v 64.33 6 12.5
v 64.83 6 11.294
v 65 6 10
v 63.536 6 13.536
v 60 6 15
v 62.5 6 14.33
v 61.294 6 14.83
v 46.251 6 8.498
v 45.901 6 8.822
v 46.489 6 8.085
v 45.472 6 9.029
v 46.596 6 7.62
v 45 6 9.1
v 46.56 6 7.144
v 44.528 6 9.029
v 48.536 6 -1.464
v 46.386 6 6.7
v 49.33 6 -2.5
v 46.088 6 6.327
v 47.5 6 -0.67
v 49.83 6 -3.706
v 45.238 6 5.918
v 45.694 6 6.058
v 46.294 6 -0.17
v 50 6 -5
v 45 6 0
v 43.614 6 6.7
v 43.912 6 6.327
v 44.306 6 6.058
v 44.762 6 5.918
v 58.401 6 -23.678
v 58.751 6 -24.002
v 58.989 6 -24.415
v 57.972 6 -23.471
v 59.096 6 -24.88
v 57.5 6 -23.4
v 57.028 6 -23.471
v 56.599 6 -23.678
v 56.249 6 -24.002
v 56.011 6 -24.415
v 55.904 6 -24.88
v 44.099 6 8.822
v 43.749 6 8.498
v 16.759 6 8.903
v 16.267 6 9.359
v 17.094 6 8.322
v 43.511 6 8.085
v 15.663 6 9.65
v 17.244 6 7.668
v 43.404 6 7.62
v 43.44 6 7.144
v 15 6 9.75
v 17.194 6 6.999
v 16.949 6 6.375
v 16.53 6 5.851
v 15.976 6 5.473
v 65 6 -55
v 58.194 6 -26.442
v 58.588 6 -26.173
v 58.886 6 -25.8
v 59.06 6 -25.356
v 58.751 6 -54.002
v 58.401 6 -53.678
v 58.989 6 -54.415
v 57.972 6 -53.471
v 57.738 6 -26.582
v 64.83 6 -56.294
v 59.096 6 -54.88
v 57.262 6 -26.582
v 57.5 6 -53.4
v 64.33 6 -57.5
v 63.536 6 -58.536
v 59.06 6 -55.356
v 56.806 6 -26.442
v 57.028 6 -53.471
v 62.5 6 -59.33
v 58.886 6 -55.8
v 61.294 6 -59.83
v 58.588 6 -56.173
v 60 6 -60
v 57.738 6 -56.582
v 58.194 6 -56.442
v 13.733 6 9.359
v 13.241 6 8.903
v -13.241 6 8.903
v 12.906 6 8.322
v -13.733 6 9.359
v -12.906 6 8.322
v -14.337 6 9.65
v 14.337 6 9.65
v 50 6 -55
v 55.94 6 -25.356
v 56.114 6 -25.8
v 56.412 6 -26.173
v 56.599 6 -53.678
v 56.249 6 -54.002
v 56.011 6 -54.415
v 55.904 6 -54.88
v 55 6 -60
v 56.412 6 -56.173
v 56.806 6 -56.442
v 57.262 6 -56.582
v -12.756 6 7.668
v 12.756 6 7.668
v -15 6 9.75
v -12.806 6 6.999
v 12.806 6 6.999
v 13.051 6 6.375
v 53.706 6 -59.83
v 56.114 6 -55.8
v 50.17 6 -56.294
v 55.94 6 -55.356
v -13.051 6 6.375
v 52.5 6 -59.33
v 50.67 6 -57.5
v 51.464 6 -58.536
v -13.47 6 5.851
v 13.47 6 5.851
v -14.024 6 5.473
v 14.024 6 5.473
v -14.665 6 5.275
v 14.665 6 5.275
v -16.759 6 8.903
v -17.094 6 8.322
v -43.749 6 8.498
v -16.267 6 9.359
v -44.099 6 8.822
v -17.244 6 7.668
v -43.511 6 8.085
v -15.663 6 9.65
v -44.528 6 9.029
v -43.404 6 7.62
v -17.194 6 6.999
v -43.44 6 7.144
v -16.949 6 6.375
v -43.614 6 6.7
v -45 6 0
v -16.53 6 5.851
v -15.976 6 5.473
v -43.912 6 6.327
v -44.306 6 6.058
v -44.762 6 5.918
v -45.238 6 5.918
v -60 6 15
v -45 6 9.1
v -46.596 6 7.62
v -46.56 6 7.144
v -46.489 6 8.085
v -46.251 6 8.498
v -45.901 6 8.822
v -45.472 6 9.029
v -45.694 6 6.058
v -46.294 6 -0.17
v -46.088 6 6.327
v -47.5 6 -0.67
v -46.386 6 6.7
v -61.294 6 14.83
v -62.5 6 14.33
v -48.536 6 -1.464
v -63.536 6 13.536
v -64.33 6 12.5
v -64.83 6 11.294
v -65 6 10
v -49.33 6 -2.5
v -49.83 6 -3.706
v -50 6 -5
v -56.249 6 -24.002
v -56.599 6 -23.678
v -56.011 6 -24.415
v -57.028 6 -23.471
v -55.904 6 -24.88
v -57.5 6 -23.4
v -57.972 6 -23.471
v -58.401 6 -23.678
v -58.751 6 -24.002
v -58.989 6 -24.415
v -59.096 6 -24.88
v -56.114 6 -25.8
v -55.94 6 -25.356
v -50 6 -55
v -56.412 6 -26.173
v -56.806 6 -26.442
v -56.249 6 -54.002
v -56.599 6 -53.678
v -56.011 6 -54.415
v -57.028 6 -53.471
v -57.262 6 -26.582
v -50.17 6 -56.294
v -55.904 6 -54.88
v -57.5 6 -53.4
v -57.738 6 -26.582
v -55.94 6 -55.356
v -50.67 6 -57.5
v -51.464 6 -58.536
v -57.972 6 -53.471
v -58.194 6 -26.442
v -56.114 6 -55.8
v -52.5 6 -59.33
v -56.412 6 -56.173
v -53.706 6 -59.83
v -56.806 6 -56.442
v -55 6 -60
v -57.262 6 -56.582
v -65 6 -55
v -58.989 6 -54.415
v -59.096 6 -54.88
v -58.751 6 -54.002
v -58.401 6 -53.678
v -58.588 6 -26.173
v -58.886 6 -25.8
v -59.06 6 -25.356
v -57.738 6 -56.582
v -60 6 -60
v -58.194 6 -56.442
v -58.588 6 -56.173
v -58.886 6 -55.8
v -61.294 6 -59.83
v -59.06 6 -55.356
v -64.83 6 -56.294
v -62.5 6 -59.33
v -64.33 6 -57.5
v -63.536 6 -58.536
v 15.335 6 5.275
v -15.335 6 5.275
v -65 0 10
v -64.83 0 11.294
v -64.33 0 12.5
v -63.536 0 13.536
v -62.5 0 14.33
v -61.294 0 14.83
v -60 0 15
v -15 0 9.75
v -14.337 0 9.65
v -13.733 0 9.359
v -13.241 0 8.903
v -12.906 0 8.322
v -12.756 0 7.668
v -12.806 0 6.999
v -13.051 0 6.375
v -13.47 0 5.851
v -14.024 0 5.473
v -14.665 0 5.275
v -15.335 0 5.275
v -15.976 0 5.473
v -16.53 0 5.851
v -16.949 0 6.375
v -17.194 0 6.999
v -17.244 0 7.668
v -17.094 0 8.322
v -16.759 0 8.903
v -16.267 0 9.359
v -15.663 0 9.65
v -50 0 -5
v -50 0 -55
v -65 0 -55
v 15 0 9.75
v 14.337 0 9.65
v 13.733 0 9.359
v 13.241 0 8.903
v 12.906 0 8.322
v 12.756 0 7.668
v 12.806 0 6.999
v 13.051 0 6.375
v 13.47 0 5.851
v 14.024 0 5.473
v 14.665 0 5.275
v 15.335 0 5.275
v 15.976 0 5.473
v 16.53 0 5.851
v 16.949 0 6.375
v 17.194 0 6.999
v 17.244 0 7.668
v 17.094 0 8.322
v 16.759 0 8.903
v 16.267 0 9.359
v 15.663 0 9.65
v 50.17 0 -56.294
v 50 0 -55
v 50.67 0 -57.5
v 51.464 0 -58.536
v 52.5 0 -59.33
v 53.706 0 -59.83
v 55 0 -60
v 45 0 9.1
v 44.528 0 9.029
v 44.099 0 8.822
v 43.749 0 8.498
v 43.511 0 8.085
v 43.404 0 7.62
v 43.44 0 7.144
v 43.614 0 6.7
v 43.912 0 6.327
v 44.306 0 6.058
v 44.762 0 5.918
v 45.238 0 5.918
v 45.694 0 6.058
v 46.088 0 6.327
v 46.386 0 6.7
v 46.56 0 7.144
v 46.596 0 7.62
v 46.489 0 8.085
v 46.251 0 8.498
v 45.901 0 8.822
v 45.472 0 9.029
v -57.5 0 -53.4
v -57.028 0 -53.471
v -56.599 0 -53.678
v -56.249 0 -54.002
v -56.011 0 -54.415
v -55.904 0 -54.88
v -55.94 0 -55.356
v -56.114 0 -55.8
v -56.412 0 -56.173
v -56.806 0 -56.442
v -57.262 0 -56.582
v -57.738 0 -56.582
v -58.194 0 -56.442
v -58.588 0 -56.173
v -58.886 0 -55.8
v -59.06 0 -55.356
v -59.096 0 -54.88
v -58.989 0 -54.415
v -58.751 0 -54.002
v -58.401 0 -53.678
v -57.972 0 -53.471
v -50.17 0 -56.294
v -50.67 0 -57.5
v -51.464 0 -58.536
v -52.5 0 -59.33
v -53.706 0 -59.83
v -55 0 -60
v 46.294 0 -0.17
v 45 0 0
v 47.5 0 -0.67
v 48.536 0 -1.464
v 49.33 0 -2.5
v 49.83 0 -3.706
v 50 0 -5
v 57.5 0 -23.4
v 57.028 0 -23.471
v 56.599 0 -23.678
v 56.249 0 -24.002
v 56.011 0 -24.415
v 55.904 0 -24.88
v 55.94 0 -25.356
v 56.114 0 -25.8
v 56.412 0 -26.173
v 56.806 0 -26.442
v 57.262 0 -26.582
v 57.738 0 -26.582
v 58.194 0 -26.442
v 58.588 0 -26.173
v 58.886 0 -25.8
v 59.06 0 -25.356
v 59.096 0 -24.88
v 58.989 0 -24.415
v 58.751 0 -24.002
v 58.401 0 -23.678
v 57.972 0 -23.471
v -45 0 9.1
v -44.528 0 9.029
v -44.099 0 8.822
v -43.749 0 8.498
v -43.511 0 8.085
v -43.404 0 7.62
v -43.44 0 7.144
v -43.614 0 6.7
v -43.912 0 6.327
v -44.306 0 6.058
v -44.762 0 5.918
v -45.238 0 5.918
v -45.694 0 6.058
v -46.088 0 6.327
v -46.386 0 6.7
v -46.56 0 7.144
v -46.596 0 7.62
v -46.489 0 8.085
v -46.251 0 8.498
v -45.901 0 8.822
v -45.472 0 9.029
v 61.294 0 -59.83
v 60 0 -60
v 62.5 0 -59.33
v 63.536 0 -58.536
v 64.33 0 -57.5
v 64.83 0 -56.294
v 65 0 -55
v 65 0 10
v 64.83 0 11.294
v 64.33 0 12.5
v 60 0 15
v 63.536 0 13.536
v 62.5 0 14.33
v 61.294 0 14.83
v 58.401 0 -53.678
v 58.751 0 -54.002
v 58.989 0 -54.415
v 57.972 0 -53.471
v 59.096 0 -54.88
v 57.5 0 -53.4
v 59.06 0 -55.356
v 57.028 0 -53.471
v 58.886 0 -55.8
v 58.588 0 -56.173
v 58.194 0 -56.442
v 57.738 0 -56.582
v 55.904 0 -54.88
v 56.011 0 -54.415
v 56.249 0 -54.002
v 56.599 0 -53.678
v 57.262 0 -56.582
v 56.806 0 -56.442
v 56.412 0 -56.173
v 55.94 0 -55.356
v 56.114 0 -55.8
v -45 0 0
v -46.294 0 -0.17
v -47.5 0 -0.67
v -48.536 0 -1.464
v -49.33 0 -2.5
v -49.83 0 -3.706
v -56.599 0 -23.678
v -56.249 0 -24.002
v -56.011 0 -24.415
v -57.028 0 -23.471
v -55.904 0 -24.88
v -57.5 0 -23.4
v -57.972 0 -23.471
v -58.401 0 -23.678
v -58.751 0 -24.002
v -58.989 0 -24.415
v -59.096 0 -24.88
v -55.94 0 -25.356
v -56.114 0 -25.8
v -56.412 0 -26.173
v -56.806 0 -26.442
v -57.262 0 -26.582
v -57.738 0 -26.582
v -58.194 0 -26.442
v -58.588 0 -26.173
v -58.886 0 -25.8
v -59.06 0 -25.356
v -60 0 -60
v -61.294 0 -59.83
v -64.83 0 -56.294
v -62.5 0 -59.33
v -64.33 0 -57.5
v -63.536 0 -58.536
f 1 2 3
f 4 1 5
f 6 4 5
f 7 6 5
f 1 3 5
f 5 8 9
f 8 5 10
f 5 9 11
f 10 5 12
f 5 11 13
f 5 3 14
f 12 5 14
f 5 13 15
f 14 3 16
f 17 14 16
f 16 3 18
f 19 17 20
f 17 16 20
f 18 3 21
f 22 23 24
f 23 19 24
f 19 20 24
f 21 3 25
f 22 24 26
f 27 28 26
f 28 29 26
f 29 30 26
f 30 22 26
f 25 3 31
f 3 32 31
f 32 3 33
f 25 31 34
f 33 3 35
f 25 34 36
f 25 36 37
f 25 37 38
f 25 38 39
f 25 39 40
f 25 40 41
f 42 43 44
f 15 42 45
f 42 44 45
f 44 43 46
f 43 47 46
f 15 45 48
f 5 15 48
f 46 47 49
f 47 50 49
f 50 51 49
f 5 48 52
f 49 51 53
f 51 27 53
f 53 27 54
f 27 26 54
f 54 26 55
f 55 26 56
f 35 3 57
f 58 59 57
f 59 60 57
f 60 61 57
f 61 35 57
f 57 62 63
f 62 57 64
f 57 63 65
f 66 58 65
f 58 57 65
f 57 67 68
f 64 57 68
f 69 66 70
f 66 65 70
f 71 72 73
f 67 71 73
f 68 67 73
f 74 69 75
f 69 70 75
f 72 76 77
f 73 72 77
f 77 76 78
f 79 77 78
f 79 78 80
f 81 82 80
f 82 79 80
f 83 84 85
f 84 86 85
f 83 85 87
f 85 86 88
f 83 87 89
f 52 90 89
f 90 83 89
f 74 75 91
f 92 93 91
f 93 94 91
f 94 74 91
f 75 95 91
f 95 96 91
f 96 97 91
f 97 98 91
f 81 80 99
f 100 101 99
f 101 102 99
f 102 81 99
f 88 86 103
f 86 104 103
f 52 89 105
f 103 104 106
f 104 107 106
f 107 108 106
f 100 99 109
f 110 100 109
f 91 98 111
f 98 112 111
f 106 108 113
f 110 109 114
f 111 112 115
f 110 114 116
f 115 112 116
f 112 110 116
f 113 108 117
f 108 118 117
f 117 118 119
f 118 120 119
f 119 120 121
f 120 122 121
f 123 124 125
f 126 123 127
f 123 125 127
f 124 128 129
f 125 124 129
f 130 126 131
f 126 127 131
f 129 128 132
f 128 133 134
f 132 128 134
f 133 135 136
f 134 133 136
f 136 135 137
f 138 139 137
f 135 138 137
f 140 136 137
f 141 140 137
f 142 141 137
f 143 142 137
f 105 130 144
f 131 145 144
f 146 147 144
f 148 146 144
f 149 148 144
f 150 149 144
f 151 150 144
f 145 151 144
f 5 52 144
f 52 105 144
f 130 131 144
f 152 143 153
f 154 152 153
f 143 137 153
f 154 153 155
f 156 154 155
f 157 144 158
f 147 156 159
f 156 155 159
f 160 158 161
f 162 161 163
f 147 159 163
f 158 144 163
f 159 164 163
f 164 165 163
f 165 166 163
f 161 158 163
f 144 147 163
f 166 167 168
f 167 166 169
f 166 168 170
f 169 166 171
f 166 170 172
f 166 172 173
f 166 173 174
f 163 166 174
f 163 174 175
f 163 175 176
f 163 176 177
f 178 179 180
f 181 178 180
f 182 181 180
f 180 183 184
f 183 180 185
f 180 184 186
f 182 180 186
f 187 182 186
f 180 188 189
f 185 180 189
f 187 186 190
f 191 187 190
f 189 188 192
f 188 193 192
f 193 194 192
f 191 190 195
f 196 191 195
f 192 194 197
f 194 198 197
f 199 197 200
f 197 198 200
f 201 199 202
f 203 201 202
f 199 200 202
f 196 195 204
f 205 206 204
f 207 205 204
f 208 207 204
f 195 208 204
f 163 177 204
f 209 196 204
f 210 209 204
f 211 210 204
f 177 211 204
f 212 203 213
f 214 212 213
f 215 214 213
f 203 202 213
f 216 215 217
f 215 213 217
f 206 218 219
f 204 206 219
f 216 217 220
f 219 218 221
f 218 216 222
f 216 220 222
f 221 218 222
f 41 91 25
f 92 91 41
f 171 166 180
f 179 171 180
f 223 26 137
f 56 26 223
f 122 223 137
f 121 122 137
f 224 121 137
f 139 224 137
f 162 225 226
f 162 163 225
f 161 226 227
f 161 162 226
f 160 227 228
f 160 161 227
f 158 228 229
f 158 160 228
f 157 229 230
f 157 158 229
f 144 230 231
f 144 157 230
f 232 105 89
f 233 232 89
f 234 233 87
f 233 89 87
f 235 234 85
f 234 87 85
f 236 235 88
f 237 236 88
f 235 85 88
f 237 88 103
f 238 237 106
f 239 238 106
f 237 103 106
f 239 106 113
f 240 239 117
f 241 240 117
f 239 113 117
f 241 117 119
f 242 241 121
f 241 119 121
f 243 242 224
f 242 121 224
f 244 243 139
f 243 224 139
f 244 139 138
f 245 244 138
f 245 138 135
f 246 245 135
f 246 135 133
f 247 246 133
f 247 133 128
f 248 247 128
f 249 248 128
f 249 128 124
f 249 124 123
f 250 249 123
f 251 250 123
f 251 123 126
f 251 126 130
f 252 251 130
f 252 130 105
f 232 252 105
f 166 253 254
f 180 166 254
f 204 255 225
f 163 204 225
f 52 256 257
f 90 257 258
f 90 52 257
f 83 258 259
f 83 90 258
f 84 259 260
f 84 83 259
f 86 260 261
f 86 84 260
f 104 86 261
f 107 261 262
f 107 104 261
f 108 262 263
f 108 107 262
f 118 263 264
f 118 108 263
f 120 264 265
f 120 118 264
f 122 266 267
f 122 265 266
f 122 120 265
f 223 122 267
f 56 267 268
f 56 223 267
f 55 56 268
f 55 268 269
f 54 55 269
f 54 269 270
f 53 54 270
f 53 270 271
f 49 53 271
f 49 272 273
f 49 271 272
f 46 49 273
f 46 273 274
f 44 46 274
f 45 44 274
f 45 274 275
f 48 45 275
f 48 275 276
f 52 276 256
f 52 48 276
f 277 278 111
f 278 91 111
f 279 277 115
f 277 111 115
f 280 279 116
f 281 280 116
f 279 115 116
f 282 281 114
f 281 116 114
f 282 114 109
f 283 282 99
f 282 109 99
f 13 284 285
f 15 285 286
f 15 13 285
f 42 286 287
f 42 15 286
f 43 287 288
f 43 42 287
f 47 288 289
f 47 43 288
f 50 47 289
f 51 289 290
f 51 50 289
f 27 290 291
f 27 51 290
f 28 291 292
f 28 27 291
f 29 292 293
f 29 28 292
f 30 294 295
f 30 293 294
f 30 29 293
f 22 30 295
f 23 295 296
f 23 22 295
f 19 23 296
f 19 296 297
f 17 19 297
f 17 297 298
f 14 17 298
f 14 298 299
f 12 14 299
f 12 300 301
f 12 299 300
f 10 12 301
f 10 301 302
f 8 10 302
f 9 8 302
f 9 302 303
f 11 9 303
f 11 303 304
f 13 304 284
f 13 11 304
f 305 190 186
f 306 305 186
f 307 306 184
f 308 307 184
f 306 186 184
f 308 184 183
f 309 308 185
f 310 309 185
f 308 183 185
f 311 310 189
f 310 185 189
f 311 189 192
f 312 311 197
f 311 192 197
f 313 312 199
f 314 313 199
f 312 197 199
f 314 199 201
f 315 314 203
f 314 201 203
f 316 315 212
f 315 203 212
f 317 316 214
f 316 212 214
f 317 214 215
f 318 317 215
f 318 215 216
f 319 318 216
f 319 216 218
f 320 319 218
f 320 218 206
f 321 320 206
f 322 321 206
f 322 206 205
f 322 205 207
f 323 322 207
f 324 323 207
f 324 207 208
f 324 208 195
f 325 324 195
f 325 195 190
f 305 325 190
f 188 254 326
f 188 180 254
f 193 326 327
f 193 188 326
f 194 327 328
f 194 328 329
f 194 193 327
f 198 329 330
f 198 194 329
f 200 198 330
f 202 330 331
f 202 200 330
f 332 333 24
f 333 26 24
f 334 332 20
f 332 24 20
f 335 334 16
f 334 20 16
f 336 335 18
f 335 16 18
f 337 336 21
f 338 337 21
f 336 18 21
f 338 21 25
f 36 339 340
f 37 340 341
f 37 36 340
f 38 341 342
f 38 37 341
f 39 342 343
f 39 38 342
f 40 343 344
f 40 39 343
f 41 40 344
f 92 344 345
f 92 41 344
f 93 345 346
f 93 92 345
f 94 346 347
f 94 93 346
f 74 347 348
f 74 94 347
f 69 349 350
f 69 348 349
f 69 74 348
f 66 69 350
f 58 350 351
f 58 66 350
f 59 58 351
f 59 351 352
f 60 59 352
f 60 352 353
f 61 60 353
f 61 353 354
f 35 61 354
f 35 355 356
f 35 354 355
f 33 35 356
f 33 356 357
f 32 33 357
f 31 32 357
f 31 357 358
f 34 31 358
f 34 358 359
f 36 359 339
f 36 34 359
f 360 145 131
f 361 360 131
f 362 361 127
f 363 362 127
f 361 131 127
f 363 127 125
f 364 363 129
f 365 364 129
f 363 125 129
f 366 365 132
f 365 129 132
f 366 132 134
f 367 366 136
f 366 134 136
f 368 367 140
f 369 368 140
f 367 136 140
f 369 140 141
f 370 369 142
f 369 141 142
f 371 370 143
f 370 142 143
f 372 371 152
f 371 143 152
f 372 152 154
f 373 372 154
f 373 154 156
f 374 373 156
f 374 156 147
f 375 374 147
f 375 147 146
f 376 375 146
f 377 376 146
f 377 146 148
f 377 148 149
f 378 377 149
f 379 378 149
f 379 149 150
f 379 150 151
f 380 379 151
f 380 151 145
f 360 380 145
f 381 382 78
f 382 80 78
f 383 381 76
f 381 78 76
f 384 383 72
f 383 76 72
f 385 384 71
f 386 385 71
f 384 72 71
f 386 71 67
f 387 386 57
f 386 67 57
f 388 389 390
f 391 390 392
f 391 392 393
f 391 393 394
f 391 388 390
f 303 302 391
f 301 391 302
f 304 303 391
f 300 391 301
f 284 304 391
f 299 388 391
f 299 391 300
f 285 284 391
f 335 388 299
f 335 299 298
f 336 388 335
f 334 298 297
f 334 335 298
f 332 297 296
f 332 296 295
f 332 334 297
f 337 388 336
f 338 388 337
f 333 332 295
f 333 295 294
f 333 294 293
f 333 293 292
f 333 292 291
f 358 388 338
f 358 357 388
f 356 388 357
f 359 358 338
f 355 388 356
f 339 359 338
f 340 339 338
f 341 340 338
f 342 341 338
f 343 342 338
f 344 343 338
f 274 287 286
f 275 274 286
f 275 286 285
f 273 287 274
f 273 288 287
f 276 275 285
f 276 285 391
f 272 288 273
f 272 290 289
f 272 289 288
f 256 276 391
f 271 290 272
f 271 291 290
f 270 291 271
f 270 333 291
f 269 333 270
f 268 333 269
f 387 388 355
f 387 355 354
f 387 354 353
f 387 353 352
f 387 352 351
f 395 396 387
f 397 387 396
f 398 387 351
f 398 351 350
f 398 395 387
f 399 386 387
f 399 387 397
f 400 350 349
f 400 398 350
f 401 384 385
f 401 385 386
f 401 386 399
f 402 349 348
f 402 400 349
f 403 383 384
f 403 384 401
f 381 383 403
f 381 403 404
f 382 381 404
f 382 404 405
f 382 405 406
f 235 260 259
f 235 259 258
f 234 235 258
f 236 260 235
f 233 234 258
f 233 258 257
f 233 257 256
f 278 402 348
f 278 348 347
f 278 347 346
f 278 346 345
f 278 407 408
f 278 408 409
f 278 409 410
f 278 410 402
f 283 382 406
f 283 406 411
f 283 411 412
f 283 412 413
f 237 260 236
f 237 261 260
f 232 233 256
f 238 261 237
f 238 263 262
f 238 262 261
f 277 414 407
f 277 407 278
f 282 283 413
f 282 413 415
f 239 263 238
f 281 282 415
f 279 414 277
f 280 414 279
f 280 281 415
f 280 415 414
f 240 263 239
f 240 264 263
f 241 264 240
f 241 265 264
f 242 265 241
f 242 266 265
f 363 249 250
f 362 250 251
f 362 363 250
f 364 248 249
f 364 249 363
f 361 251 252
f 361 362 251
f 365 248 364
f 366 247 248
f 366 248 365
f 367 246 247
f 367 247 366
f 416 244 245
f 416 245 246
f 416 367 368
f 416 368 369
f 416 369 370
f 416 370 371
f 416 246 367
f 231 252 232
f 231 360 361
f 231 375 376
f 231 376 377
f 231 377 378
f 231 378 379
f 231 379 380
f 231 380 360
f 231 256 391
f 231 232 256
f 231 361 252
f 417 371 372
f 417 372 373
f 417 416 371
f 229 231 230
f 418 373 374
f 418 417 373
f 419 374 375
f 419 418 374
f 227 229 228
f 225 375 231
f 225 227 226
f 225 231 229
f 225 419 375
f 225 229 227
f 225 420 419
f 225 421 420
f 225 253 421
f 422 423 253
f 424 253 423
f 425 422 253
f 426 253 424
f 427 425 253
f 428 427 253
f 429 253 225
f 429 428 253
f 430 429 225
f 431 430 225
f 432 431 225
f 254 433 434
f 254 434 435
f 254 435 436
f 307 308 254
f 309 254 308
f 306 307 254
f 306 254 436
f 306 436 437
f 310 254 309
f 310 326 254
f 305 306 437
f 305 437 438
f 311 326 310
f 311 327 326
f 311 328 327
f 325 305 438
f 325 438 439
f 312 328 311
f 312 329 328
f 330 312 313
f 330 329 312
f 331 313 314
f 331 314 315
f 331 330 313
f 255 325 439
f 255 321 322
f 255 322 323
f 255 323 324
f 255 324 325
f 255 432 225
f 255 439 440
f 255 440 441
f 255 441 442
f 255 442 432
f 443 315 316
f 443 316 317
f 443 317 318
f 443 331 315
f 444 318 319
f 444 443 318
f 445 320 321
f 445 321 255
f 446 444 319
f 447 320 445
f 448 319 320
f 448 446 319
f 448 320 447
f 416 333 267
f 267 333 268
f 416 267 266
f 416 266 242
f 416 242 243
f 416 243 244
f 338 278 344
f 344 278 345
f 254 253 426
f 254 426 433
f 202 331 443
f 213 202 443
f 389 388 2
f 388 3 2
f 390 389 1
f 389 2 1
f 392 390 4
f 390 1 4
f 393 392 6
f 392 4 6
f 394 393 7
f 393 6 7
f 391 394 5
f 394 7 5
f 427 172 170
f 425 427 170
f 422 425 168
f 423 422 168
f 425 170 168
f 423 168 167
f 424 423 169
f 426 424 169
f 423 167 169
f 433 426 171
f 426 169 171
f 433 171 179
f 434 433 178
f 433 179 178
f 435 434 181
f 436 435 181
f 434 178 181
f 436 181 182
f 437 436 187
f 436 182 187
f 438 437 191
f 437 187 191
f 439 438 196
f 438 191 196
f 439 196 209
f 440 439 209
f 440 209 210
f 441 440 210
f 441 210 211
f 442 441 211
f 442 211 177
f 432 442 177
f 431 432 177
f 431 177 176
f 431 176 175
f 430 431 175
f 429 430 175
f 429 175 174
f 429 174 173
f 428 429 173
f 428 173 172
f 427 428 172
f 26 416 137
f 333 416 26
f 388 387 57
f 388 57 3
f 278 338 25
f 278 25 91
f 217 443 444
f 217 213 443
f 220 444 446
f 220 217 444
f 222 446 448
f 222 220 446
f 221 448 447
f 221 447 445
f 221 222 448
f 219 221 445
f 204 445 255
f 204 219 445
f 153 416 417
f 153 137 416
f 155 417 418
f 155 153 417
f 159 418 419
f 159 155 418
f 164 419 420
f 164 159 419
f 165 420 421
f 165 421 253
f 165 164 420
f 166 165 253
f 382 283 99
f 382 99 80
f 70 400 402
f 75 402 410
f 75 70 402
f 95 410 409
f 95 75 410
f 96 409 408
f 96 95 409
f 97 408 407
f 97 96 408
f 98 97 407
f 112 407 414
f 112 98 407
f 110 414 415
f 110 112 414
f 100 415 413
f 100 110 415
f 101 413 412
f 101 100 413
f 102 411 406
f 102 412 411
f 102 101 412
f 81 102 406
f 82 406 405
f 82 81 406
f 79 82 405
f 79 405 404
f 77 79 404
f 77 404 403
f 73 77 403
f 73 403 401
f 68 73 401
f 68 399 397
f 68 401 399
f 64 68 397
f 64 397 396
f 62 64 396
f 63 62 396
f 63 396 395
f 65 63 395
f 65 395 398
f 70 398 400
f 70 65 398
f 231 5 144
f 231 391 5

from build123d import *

# Parameters (mm, degrees)
BOSS_EXTRUDE1_DEPTH  = 6
FILLET1_R            = 5
SKETCH2_R            = 2.25
SKETCH2_R_2          = 1.6
CUT_EXTRUDE1_DEPTH   = 89.662280593
FILLET1_OF_MIRROR1_R = 5


with BuildPart() as part:
    # Sketch1 → Boss-Extrude1 (new body)
    with BuildSketch(Plane(origin=(0, 0, 0), x_dir=(1, 0, 0), z_dir=(0, 1, 0))):
        Polygon((0, 0), (-50, 0), (-50, 60), (-65, 60), (-65, -15), (0, -15), align=None)
    boss_extrude1 = extrude(amount=BOSS_EXTRUDE1_DEPTH)

    # Fillet1
    fillet1_edges = [part.edges().sort_by_distance(p)[0] for p in [
        (-65, 3, 15),
        (-65, 3, -60),
        (-50, 3, -60),
        (-50, 3, 0),
    ]]
    fillet(fillet1_edges, radius=FILLET1_R)

    # Sketch2 → Cut-Extrude1 (cut, through all)
    with BuildSketch(Plane(origin=(0, 6, 0), x_dir=(1, 0, 0), z_dir=(0, 1, 0))):
        with Locations(Location((-15, -7.5, 0), (0, 0, 270))):
            Circle(SKETCH2_R)
        with Locations(Location((-45, -7.5, 0), (0, 0, 270))):
            Circle(SKETCH2_R_2)
        with Locations(Location((-57.5, 55, 0), (0, 0, 270))):
            Circle(SKETCH2_R_2)
        with Locations(Location((-57.5, 25, 0), (0, 0, 270))):
            Circle(SKETCH2_R_2)
    cut_extrude1 = extrude(amount=-CUT_EXTRUDE1_DEPTH, mode=Mode.SUBTRACT)

    # Mirror1: Boss-Extrude1, Cut-Extrude1 across plane
    add(boss_extrude1.mirror(Plane(origin=(0, 0, 0), x_dir=(0, 0, 1), z_dir=(1, 0, 0))))
    add(cut_extrude1.mirror(Plane(origin=(0, 0, 0), x_dir=(0, 0, 1), z_dir=(1, 0, 0))), mode=Mode.SUBTRACT)

    # Fillet1 of Mirror1
    fillet1_of_mirror1_edges = [part.edges().sort_by_distance(p)[0] for p in [
        (65, 3, 15),
        (65, 3, -60),
        (50, 3, -60),
        (50, 3, 0),
    ]]
    fillet(fillet1_of_mirror1_edges, radius=FILLET1_OF_MIRROR1_R)


solid = part.part
